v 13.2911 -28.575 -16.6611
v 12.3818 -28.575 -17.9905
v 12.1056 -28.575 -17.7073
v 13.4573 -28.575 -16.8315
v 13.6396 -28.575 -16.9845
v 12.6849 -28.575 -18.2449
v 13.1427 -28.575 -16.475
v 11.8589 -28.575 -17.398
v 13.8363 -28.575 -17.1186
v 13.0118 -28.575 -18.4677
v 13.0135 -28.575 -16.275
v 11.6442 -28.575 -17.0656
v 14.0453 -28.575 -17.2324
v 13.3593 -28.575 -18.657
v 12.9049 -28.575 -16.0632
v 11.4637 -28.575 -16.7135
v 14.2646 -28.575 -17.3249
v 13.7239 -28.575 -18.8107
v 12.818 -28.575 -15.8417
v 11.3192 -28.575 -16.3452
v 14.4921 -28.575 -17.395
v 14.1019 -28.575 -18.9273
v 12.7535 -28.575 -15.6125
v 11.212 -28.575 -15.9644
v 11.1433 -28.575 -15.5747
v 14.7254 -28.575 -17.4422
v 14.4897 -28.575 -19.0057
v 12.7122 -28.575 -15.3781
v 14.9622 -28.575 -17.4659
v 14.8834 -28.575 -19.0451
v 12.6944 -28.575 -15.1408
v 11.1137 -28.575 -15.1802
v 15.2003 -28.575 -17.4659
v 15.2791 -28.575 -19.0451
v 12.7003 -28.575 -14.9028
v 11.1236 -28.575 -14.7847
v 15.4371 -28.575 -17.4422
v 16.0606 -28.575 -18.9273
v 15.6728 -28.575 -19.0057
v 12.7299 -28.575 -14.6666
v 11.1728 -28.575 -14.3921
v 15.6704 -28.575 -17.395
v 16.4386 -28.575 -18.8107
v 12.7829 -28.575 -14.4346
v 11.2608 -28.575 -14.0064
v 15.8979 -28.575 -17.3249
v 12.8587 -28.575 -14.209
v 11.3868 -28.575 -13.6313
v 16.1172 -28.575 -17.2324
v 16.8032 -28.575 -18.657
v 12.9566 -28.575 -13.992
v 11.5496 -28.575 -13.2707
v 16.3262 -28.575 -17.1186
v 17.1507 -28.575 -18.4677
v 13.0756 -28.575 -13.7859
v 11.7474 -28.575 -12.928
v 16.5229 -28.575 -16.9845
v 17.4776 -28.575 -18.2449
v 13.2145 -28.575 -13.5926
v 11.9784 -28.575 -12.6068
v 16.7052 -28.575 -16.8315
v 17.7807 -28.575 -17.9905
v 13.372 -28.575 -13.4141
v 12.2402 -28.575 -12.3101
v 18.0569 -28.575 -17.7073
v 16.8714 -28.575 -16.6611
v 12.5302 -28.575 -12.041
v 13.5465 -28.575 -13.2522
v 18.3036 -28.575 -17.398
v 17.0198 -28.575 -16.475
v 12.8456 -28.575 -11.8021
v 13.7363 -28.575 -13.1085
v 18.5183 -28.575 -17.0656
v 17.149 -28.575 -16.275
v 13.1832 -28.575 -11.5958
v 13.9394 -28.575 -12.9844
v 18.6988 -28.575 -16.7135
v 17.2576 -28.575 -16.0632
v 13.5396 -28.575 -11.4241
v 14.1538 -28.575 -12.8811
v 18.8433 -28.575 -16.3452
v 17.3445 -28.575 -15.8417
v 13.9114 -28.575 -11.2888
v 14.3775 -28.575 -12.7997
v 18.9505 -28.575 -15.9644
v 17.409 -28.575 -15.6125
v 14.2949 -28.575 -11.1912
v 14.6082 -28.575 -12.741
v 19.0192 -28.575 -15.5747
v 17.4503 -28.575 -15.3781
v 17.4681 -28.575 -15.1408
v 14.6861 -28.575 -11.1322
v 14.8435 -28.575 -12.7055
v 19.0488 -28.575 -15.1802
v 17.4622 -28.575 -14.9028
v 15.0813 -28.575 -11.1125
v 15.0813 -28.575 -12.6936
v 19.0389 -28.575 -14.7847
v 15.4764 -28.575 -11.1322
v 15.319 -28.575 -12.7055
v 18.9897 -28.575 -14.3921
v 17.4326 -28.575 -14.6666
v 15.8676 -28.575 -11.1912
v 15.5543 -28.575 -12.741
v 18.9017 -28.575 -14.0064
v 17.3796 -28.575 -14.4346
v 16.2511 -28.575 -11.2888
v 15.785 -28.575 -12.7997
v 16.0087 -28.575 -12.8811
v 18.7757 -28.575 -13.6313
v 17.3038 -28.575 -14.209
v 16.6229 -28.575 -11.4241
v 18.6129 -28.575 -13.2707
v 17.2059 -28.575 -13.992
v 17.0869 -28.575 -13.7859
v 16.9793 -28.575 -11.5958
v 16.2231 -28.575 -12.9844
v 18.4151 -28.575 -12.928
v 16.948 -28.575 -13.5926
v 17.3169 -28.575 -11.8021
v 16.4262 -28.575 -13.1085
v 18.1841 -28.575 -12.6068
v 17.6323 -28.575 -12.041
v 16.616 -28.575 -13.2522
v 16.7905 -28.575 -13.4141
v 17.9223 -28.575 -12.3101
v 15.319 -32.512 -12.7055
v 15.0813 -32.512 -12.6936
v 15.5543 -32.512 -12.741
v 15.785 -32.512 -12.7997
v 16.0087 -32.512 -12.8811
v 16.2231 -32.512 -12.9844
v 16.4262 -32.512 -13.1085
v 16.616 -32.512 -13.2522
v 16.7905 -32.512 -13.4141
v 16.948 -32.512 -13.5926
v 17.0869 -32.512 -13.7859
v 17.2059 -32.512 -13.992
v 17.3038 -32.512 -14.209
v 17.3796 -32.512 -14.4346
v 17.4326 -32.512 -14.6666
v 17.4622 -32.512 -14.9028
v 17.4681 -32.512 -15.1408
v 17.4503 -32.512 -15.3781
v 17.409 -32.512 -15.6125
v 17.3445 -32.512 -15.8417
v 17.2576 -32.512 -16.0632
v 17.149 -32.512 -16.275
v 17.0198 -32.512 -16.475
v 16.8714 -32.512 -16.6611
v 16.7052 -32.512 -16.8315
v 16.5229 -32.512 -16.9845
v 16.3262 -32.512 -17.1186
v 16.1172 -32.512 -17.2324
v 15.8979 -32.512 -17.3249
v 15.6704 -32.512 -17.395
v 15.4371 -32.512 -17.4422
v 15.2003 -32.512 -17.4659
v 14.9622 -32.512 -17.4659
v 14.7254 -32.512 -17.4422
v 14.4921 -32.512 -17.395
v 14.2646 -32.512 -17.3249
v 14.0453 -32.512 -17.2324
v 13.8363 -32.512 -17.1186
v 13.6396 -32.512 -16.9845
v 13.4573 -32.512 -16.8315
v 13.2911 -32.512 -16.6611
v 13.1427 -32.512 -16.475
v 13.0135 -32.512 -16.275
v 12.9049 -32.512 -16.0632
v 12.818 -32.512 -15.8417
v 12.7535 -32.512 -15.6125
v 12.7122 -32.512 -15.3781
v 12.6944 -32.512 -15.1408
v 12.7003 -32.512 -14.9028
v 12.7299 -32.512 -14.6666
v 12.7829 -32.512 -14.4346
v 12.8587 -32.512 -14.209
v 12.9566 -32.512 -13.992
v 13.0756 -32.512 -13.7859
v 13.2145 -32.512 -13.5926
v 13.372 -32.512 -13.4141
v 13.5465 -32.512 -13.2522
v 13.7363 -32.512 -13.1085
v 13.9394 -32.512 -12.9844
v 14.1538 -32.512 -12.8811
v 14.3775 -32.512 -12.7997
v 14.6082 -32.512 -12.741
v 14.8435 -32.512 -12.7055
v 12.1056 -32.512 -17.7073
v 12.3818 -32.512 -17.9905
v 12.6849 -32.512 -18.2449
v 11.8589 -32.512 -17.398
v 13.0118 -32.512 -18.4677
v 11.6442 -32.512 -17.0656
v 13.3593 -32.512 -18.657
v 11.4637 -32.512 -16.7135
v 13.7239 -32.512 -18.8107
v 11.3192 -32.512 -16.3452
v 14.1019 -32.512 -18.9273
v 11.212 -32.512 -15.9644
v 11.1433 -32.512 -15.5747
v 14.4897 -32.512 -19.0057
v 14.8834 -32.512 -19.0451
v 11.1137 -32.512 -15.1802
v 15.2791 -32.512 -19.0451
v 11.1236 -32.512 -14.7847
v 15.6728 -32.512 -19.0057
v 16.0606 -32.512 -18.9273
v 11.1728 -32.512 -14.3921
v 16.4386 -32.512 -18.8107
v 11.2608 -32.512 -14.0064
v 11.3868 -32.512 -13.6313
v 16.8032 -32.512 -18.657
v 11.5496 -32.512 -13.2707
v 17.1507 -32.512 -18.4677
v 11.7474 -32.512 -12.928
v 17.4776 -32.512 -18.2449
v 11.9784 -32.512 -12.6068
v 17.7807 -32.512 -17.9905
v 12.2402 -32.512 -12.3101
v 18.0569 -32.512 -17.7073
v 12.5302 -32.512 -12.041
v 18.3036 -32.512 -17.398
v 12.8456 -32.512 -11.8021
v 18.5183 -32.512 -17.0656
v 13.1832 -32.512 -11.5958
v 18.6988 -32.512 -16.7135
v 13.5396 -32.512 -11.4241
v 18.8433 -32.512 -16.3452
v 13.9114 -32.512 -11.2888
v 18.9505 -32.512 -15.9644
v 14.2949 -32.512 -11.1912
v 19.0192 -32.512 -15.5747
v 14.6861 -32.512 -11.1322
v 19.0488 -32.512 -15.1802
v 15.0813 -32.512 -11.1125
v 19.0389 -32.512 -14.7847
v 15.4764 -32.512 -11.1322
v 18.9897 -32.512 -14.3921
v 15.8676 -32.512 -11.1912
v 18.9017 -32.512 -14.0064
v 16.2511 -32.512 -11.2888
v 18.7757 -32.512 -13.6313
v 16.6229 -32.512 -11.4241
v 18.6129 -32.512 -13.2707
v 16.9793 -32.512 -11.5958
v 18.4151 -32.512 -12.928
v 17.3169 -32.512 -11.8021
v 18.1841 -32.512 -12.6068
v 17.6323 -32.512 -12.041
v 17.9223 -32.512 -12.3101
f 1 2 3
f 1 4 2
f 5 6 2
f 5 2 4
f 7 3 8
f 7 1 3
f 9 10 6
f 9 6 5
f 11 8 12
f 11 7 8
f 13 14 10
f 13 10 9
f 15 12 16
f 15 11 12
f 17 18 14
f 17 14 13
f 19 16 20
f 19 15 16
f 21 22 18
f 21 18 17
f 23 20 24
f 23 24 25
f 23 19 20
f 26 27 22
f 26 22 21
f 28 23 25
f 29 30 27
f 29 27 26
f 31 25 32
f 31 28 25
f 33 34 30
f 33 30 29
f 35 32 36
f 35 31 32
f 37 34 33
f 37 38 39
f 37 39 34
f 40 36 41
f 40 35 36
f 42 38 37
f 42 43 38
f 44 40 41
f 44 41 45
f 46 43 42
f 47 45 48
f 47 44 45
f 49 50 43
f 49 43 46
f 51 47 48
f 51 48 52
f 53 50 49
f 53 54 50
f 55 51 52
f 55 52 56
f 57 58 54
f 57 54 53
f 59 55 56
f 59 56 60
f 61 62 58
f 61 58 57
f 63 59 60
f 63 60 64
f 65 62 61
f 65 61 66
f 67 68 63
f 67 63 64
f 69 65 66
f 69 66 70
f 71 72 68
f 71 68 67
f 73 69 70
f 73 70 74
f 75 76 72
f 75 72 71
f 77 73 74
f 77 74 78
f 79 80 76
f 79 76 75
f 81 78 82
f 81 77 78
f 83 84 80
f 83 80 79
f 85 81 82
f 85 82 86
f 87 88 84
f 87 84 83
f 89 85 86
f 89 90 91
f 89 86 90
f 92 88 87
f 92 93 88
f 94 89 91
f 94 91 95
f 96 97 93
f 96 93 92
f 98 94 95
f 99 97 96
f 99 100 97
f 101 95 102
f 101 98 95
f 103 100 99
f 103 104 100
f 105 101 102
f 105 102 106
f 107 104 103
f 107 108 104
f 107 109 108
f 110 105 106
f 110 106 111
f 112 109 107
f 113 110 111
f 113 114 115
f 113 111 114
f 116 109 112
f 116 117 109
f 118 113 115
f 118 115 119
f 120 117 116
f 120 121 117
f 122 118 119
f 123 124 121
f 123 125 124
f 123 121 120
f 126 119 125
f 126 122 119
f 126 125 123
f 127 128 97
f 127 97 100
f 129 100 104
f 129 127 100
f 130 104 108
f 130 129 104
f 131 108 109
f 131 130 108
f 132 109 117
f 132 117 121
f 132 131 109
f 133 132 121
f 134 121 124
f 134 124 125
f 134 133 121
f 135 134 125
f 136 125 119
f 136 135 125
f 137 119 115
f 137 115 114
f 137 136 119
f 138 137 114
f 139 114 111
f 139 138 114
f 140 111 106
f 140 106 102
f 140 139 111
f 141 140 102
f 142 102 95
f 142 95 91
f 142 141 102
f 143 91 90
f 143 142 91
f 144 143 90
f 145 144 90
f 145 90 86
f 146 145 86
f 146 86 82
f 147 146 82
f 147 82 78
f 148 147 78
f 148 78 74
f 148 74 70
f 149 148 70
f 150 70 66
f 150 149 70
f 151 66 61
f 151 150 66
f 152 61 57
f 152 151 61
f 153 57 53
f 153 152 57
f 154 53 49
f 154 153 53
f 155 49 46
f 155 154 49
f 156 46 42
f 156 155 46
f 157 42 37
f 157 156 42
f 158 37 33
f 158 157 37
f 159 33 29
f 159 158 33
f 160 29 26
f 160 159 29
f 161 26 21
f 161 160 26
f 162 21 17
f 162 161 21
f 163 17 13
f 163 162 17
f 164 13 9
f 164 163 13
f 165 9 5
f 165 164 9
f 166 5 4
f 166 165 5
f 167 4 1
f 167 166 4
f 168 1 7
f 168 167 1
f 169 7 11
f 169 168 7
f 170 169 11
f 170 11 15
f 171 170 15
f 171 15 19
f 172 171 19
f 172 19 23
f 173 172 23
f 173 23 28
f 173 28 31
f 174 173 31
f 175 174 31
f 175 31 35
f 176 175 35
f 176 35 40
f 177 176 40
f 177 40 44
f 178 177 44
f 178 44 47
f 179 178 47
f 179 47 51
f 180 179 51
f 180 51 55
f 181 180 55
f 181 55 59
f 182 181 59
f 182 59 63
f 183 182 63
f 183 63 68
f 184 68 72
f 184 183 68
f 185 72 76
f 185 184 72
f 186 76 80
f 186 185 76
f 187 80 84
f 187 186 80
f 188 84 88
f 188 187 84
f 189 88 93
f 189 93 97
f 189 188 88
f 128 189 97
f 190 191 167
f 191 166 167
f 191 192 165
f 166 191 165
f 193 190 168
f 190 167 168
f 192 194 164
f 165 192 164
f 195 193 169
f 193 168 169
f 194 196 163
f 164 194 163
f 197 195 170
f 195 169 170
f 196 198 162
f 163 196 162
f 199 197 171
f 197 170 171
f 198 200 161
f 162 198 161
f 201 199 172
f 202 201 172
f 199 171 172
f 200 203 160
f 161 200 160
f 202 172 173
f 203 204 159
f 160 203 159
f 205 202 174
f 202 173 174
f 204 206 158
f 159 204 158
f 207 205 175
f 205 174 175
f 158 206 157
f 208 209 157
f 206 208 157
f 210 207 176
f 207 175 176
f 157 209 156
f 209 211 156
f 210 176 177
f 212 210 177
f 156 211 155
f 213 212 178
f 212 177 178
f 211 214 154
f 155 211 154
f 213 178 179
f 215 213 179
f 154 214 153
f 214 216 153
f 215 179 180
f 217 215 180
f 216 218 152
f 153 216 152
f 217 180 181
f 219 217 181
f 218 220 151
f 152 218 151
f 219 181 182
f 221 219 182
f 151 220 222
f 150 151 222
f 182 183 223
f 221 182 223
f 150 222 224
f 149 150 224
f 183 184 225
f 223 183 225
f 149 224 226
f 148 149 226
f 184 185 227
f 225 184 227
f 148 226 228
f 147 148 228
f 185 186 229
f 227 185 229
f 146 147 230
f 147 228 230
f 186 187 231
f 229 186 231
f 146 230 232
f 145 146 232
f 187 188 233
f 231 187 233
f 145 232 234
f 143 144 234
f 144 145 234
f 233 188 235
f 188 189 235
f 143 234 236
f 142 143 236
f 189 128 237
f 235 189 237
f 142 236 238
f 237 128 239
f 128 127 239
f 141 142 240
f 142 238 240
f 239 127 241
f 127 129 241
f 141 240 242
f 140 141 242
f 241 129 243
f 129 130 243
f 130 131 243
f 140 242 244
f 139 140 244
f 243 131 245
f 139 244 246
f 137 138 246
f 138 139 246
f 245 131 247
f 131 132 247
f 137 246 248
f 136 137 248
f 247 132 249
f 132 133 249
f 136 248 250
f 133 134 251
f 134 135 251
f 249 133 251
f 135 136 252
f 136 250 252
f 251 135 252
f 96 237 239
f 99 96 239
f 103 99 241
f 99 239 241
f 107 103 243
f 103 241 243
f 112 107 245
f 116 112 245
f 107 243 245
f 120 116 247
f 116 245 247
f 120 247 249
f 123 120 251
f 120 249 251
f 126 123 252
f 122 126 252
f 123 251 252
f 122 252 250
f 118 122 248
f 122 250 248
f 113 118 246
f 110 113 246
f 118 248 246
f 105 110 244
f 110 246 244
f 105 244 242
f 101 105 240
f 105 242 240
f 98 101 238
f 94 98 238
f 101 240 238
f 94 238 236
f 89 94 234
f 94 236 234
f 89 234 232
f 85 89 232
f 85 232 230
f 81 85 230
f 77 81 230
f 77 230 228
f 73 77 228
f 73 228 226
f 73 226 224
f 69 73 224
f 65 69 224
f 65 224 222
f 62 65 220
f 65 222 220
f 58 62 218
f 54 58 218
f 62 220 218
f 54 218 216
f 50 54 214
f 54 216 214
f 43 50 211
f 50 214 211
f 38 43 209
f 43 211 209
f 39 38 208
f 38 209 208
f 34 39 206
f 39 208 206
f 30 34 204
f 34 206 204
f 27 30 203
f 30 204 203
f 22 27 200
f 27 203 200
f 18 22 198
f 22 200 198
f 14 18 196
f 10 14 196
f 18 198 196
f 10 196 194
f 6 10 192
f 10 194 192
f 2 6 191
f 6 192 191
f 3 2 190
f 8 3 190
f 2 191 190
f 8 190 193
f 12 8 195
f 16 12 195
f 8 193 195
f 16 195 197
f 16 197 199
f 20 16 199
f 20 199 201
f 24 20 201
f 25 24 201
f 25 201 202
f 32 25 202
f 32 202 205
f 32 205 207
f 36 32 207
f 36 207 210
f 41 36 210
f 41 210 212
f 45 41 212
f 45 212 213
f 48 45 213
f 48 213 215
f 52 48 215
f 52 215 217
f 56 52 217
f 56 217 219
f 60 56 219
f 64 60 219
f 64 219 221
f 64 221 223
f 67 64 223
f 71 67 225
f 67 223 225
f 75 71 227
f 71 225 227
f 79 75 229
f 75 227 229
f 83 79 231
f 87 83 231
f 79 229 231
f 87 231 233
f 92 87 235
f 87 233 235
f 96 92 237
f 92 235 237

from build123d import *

# Parameters (mm, degrees)
SKETCH1_W           = 38.1
SKETCH1_H           = 38.1
SKETCH1_R           = 4
SKETCH1_R_2         = 1.5875
SKETCH1_R_3         = 1.25
BOSS_EXTRUDE1_DEPTH = 3.175
SKETCH4_R           = 1.7272
CUT_EXTRUDE2_DEPTH  = 10.795
SKETCH7_R           = 2.15265
CUT_EXTRUDE3_DEPTH  = 7.3500001
CIRPATTERN1_COUNT   = 4
SKETCH6_W           = 38.1
SKETCH6_H           = 38.1
SKETCH6_R           = 6.5
SKETCH6_R_2         = 2.15265
BOSS_EXTRUDE2_DEPTH = 3.175
FILLET1_R           = 2.54
FILLET2_R           = 2.54
SKETCH8_R           = 3.96875
SKETCH8_R_2         = 2.3876
BOSS_EXTRUDE3_DEPTH = 3.937
CIRPATTERN2_COUNT   = 4


with BuildPart() as part:
    # Sketch1 → Boss-Extrude1 (new body, symmetric)
    with BuildSketch(Plane(origin=(0, 0, 0), x_dir=(1, 0, 0), z_dir=(0, 1, 0))):
        Rectangle(SKETCH1_W, SKETCH1_H)
        Circle(SKETCH1_R, mode=Mode.SUBTRACT)
        with Locations((8.838834765, 8.838834765)):
            Circle(SKETCH1_R_2, mode=Mode.SUBTRACT)
        with Locations((8.838834765, -8.838834765)):
            Circle(SKETCH1_R_2, mode=Mode.SUBTRACT)
        with Locations((-8.838834765, -8.838834765)):
            Circle(SKETCH1_R_2, mode=Mode.SUBTRACT)
        with Locations((-8.838834765, 8.838834765)):
            Circle(SKETCH1_R_2, mode=Mode.SUBTRACT)
        with Locations((-14.5, 0)):
            Circle(SKETCH1_R_3, mode=Mode.SUBTRACT)
        with Locations((0, 14.5)):
            Circle(SKETCH1_R_3, mode=Mode.SUBTRACT)
        with Locations((14.5, 0)):
            Circle(SKETCH1_R_3, mode=Mode.SUBTRACT)
        with Locations((0, -14.5)):
            Circle(SKETCH1_R_3, mode=Mode.SUBTRACT)
    extrude(amount=BOSS_EXTRUDE1_DEPTH, both=True)

    # Sketch4 → Cut-Extrude2 (cut)
    with BuildSketch(Plane.XY.offset(19.05)):
        with Locations((-5.55625, 0)):
            Circle(SKETCH4_R)
        with Locations((5.55625, 0)):
            Circle(SKETCH4_R)
    cut_extrude2 = extrude(amount=-CUT_EXTRUDE2_DEPTH, mode=Mode.SUBTRACT)

    # Sketch7 → Cut-Extrude3 (cut, through all)
    with BuildSketch(Plane.XZ.offset(3.175)):
        with Locations((-15.08125, 15.08125)):
            Circle(SKETCH7_R)
        with Locations((15.08125, 15.08125)):
            Circle(SKETCH7_R)
        with Locations((15.08125, -15.08125)):
            Circle(SKETCH7_R)
        with Locations((-15.08125, -15.08125)):
            Circle(SKETCH7_R)
    extrude(amount=-CUT_EXTRUDE3_DEPTH, mode=Mode.SUBTRACT)

    # CirPattern1: Cut-Extrude2 ×4 about axis
    cirpattern1_axis = Axis((0, 0, 0), (0, 1, 0))
    for i in range(1, CIRPATTERN1_COUNT):
        add(cut_extrude2.rotate(cirpattern1_axis, i * 360 / CIRPATTERN1_COUNT), mode=Mode.SUBTRACT)

    # Fillet1
    fillet1_edges = [part.edges().sort_by_distance(p)[0] for p in [
        (19.05, 0, 19.05),
        (-19.05, 0, 19.05),
        (-19.05, 0, -19.05),
        (19.05, 0, -19.05),
    ]]
    fillet(fillet1_edges, radius=FILLET1_R)


with BuildPart() as body_2:
    # Sketch6 → Boss-Extrude2 (new body)
    with BuildSketch(Plane(origin=(0, -32.512, 0), x_dir=(-1, 0, 0), z_dir=(0, -1, 0))):
        Rectangle(SKETCH6_W, SKETCH6_H)
        Circle(SKETCH6_R, mode=Mode.SUBTRACT)
        with Locations((-15.08125, 15.08125)):
            Circle(SKETCH6_R_2, mode=Mode.SUBTRACT)
        with Locations((15.08125, 15.08125)):
            Circle(SKETCH6_R_2, mode=Mode.SUBTRACT)
        with Locations((15.08125, -15.08125)):
            Circle(SKETCH6_R_2, mode=Mode.SUBTRACT)
        with Locations((-15.08125, -15.08125)):
            Circle(SKETCH6_R_2, mode=Mode.SUBTRACT)
    extrude(amount=BOSS_EXTRUDE2_DEPTH)

    # Fillet2
    fillet2_edges = [body_2.edges().sort_by_distance(p)[0] for p in [
        (-19.05, -34.0995, 19.05),
        (19.05, -34.0995, 19.05),
        (19.05, -34.0995, -19.05),
        (-19.05, -34.0995, -19.05),
    ]]
    fillet(fillet2_edges, radius=FILLET2_R)


with BuildPart() as body_3:
    # Sketch8 → Boss-Extrude3 (new body)
    with BuildSketch(Plane(origin=(0, -32.512, 0), x_dir=(1, 0, 0), z_dir=(0, 1, 0))):
        with Locations((-15.08125, 15.08125)):
            Circle(SKETCH8_R)
        with Locations((-15.08125, 15.08125)):
            Circle(SKETCH8_R_2, mode=Mode.SUBTRACT)
    extrude(amount=BOSS_EXTRUDE3_DEPTH)


with BuildPart() as cirpattern2_1:
    # CirPattern2: pattern copy
    add(body_3.part.rotate(Axis((0, 0, 0), (0, 1, 0)), 1 * 360 / CIRPATTERN2_COUNT))


with BuildPart() as cirpattern2_2:
    # CirPattern2: pattern copy
    add(body_3.part.rotate(Axis((0, 0, 0), (0, 1, 0)), 2 * 360 / CIRPATTERN2_COUNT))


with BuildPart() as cirpattern2_3:
    # CirPattern2: pattern copy
    add(body_3.part.rotate(Axis((0, 0, 0), (0, 1, 0)), 3 * 360 / CIRPATTERN2_COUNT))


solid = cirpattern2_3.part
